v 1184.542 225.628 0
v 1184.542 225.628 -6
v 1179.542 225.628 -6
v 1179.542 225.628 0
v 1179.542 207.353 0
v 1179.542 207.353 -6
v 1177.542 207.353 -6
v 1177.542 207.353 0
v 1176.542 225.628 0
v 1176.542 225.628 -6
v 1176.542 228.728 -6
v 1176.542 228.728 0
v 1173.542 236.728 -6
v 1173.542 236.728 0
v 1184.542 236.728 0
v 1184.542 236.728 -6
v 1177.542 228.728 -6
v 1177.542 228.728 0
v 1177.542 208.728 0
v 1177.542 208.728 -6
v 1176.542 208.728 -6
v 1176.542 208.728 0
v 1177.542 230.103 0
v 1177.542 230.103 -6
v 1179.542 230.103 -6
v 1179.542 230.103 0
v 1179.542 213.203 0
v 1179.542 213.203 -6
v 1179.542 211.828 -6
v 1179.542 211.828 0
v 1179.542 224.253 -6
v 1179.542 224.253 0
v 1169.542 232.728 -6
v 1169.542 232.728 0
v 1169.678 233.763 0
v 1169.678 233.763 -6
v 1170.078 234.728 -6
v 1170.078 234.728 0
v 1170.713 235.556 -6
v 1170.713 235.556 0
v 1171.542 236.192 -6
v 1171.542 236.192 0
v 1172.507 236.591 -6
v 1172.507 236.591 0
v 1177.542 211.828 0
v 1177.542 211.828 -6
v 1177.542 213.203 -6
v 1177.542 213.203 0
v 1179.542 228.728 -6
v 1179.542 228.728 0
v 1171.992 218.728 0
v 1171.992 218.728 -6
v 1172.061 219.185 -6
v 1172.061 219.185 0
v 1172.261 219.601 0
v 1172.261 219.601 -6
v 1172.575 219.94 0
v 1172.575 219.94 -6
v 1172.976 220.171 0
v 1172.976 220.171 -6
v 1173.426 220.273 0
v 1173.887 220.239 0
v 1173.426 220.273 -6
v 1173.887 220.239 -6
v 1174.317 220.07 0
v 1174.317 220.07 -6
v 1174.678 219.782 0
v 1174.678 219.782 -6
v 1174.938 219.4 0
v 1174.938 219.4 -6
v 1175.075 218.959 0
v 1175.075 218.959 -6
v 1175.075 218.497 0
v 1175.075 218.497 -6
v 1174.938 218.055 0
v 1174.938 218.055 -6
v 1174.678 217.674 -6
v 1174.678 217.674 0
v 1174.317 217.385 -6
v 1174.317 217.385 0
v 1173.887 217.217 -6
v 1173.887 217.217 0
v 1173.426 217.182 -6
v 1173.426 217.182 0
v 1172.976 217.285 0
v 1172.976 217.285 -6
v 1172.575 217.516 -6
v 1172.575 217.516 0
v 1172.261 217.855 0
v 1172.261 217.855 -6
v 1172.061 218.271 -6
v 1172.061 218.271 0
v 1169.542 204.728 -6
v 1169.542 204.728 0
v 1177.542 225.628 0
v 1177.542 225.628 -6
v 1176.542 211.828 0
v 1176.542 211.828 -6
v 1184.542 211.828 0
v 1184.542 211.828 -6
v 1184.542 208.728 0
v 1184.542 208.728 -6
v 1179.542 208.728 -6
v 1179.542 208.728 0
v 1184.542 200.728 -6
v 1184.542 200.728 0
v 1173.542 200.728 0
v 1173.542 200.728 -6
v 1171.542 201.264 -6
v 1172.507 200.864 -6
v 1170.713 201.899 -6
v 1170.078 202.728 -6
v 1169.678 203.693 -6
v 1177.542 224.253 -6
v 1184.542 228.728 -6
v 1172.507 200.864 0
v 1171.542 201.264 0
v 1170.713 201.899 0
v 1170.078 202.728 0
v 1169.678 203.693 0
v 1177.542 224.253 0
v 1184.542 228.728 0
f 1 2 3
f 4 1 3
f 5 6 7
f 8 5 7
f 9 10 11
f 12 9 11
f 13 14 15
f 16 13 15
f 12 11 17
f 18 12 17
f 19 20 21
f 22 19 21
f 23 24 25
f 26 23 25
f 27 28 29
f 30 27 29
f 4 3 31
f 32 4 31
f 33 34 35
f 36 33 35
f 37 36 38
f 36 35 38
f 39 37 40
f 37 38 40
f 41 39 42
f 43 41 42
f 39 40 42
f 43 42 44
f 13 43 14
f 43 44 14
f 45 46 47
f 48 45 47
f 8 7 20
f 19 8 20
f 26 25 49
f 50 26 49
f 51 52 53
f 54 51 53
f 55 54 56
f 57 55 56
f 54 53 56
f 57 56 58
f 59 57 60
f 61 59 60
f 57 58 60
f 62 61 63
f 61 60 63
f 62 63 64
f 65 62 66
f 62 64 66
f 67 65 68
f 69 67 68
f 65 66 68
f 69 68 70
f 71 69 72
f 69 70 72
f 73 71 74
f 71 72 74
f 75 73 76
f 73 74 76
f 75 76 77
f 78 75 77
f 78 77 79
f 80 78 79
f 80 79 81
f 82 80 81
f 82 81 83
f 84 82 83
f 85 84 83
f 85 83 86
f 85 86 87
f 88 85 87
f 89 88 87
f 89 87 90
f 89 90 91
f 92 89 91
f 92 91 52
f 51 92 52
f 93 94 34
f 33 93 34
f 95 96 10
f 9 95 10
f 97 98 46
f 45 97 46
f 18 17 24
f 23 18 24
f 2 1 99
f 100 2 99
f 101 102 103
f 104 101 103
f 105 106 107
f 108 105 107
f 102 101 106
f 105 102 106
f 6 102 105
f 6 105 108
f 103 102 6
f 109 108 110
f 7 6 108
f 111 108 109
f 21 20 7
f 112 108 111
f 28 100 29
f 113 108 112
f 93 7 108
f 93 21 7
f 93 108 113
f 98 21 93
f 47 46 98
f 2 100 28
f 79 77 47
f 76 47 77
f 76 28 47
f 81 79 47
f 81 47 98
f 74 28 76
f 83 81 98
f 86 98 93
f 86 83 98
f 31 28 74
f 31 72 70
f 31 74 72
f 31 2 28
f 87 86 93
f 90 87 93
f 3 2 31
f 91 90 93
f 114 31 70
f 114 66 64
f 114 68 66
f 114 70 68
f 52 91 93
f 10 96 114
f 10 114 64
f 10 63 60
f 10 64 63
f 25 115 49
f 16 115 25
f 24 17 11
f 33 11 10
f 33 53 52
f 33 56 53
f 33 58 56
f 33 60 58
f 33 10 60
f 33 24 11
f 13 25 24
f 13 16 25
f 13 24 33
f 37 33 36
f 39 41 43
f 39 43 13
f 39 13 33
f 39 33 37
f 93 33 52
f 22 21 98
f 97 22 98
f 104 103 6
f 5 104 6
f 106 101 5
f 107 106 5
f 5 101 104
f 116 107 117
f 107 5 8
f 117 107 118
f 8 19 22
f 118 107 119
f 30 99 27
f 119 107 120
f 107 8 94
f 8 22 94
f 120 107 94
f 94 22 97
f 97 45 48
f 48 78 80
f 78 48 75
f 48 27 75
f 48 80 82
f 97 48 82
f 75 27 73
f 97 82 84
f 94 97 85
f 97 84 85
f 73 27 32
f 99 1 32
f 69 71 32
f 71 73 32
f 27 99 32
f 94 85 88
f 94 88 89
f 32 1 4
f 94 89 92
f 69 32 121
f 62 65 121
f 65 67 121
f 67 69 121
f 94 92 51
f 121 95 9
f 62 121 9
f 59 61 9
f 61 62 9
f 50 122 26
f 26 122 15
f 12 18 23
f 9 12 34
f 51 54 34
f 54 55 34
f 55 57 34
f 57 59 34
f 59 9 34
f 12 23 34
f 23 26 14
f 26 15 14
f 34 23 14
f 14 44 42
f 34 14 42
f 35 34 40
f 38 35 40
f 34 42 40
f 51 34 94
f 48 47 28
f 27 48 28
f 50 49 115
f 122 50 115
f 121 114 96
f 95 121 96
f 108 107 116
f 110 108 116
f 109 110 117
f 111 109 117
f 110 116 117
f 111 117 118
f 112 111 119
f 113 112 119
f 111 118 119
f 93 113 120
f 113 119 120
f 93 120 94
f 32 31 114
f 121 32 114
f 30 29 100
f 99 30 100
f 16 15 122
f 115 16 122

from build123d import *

# Parameters (mm, degrees)
DODANIE_WYCI_GNI_CIE1_DEPTH = 6
WYTNIJ_WYCI_GNI_CIE1_DEPTH  = 15
SZYK_LINIOWY1_COUNT         = 2
SZYK_LINIOWY1_PITCH         = 16.9
SZKIC3_R                    = 1.55
WYTNIJ_WYCI_GNI_CIE2_DEPTH  = 15


with BuildPart() as part:
    # Szkic1 → Dodanie-wyciągnięcie1 (new body)
    with BuildSketch(Plane(origin=(302.151296802, 0, 0), x_dir=(-1, 0, 0), z_dir=(0, 0, -1))):
        with BuildLine():
            Line((-882.390597923, 236.727796113), (-882.390597923, 200.727796113))
            Line((-882.390597923, 200.727796113), (-871.390597923, 200.727796113))
            ThreePointArc((-871.390597923, 200.727796113), (-868.562170798, 201.899368988), (-867.390597923, 204.727796113))
            Line((-867.390597923, 204.727796113), (-867.390597923, 232.727796113))
            ThreePointArc((-867.390597923, 232.727796113), (-868.562170798, 235.556223238), (-871.390597923, 236.727796113))
            Line((-871.390597923, 236.727796113), (-882.390597923, 236.727796113))
        make_face()
    extrude(amount=DODANIE_WYCI_GNI_CIE1_DEPTH)

    # Szkic2 → Wytnij-wyciągnięcie1 (cut)
    with BuildSketch(Plane(origin=(1169.541894725, 0, -6), x_dir=(1, 0, 0), z_dir=(0, 0, 1))):
        Polygon((15, 228.727796113), (15, 225.627796113), (10, 225.627796113), (10, 224.252796113), (8, 224.252796113), (8, 225.627796113), (7, 225.627796113), (7, 228.727796113), (8, 228.727796113), (8, 230.102796113), (10, 230.102796113), (10, 228.727796113), align=None)
    wytnij_wyci_gni_cie1 = extrude(amount=WYTNIJ_WYCI_GNI_CIE1_DEPTH, mode=Mode.SUBTRACT)

    # Szyk liniowy1: Wytnij-wyciągnięcie1 ×2
    with Locations(*[(0, -i * SZYK_LINIOWY1_PITCH, 0) for i in range(1, SZYK_LINIOWY1_COUNT)]):
        add(wytnij_wyci_gni_cie1, mode=Mode.SUBTRACT)

    # Szkic3 → Wytnij-wyciągnięcie2 (cut)
    with BuildSketch(Plane(origin=(0, 0, -6), x_dir=(-1, 0, 0), z_dir=(0, 0, -1))):
        with Locations((-1173.541894725, 218.727796113)):
            Circle(SZKIC3_R)
    extrude(amount=-WYTNIJ_WYCI_GNI_CIE2_DEPTH, mode=Mode.SUBTRACT)


solid = part.part
